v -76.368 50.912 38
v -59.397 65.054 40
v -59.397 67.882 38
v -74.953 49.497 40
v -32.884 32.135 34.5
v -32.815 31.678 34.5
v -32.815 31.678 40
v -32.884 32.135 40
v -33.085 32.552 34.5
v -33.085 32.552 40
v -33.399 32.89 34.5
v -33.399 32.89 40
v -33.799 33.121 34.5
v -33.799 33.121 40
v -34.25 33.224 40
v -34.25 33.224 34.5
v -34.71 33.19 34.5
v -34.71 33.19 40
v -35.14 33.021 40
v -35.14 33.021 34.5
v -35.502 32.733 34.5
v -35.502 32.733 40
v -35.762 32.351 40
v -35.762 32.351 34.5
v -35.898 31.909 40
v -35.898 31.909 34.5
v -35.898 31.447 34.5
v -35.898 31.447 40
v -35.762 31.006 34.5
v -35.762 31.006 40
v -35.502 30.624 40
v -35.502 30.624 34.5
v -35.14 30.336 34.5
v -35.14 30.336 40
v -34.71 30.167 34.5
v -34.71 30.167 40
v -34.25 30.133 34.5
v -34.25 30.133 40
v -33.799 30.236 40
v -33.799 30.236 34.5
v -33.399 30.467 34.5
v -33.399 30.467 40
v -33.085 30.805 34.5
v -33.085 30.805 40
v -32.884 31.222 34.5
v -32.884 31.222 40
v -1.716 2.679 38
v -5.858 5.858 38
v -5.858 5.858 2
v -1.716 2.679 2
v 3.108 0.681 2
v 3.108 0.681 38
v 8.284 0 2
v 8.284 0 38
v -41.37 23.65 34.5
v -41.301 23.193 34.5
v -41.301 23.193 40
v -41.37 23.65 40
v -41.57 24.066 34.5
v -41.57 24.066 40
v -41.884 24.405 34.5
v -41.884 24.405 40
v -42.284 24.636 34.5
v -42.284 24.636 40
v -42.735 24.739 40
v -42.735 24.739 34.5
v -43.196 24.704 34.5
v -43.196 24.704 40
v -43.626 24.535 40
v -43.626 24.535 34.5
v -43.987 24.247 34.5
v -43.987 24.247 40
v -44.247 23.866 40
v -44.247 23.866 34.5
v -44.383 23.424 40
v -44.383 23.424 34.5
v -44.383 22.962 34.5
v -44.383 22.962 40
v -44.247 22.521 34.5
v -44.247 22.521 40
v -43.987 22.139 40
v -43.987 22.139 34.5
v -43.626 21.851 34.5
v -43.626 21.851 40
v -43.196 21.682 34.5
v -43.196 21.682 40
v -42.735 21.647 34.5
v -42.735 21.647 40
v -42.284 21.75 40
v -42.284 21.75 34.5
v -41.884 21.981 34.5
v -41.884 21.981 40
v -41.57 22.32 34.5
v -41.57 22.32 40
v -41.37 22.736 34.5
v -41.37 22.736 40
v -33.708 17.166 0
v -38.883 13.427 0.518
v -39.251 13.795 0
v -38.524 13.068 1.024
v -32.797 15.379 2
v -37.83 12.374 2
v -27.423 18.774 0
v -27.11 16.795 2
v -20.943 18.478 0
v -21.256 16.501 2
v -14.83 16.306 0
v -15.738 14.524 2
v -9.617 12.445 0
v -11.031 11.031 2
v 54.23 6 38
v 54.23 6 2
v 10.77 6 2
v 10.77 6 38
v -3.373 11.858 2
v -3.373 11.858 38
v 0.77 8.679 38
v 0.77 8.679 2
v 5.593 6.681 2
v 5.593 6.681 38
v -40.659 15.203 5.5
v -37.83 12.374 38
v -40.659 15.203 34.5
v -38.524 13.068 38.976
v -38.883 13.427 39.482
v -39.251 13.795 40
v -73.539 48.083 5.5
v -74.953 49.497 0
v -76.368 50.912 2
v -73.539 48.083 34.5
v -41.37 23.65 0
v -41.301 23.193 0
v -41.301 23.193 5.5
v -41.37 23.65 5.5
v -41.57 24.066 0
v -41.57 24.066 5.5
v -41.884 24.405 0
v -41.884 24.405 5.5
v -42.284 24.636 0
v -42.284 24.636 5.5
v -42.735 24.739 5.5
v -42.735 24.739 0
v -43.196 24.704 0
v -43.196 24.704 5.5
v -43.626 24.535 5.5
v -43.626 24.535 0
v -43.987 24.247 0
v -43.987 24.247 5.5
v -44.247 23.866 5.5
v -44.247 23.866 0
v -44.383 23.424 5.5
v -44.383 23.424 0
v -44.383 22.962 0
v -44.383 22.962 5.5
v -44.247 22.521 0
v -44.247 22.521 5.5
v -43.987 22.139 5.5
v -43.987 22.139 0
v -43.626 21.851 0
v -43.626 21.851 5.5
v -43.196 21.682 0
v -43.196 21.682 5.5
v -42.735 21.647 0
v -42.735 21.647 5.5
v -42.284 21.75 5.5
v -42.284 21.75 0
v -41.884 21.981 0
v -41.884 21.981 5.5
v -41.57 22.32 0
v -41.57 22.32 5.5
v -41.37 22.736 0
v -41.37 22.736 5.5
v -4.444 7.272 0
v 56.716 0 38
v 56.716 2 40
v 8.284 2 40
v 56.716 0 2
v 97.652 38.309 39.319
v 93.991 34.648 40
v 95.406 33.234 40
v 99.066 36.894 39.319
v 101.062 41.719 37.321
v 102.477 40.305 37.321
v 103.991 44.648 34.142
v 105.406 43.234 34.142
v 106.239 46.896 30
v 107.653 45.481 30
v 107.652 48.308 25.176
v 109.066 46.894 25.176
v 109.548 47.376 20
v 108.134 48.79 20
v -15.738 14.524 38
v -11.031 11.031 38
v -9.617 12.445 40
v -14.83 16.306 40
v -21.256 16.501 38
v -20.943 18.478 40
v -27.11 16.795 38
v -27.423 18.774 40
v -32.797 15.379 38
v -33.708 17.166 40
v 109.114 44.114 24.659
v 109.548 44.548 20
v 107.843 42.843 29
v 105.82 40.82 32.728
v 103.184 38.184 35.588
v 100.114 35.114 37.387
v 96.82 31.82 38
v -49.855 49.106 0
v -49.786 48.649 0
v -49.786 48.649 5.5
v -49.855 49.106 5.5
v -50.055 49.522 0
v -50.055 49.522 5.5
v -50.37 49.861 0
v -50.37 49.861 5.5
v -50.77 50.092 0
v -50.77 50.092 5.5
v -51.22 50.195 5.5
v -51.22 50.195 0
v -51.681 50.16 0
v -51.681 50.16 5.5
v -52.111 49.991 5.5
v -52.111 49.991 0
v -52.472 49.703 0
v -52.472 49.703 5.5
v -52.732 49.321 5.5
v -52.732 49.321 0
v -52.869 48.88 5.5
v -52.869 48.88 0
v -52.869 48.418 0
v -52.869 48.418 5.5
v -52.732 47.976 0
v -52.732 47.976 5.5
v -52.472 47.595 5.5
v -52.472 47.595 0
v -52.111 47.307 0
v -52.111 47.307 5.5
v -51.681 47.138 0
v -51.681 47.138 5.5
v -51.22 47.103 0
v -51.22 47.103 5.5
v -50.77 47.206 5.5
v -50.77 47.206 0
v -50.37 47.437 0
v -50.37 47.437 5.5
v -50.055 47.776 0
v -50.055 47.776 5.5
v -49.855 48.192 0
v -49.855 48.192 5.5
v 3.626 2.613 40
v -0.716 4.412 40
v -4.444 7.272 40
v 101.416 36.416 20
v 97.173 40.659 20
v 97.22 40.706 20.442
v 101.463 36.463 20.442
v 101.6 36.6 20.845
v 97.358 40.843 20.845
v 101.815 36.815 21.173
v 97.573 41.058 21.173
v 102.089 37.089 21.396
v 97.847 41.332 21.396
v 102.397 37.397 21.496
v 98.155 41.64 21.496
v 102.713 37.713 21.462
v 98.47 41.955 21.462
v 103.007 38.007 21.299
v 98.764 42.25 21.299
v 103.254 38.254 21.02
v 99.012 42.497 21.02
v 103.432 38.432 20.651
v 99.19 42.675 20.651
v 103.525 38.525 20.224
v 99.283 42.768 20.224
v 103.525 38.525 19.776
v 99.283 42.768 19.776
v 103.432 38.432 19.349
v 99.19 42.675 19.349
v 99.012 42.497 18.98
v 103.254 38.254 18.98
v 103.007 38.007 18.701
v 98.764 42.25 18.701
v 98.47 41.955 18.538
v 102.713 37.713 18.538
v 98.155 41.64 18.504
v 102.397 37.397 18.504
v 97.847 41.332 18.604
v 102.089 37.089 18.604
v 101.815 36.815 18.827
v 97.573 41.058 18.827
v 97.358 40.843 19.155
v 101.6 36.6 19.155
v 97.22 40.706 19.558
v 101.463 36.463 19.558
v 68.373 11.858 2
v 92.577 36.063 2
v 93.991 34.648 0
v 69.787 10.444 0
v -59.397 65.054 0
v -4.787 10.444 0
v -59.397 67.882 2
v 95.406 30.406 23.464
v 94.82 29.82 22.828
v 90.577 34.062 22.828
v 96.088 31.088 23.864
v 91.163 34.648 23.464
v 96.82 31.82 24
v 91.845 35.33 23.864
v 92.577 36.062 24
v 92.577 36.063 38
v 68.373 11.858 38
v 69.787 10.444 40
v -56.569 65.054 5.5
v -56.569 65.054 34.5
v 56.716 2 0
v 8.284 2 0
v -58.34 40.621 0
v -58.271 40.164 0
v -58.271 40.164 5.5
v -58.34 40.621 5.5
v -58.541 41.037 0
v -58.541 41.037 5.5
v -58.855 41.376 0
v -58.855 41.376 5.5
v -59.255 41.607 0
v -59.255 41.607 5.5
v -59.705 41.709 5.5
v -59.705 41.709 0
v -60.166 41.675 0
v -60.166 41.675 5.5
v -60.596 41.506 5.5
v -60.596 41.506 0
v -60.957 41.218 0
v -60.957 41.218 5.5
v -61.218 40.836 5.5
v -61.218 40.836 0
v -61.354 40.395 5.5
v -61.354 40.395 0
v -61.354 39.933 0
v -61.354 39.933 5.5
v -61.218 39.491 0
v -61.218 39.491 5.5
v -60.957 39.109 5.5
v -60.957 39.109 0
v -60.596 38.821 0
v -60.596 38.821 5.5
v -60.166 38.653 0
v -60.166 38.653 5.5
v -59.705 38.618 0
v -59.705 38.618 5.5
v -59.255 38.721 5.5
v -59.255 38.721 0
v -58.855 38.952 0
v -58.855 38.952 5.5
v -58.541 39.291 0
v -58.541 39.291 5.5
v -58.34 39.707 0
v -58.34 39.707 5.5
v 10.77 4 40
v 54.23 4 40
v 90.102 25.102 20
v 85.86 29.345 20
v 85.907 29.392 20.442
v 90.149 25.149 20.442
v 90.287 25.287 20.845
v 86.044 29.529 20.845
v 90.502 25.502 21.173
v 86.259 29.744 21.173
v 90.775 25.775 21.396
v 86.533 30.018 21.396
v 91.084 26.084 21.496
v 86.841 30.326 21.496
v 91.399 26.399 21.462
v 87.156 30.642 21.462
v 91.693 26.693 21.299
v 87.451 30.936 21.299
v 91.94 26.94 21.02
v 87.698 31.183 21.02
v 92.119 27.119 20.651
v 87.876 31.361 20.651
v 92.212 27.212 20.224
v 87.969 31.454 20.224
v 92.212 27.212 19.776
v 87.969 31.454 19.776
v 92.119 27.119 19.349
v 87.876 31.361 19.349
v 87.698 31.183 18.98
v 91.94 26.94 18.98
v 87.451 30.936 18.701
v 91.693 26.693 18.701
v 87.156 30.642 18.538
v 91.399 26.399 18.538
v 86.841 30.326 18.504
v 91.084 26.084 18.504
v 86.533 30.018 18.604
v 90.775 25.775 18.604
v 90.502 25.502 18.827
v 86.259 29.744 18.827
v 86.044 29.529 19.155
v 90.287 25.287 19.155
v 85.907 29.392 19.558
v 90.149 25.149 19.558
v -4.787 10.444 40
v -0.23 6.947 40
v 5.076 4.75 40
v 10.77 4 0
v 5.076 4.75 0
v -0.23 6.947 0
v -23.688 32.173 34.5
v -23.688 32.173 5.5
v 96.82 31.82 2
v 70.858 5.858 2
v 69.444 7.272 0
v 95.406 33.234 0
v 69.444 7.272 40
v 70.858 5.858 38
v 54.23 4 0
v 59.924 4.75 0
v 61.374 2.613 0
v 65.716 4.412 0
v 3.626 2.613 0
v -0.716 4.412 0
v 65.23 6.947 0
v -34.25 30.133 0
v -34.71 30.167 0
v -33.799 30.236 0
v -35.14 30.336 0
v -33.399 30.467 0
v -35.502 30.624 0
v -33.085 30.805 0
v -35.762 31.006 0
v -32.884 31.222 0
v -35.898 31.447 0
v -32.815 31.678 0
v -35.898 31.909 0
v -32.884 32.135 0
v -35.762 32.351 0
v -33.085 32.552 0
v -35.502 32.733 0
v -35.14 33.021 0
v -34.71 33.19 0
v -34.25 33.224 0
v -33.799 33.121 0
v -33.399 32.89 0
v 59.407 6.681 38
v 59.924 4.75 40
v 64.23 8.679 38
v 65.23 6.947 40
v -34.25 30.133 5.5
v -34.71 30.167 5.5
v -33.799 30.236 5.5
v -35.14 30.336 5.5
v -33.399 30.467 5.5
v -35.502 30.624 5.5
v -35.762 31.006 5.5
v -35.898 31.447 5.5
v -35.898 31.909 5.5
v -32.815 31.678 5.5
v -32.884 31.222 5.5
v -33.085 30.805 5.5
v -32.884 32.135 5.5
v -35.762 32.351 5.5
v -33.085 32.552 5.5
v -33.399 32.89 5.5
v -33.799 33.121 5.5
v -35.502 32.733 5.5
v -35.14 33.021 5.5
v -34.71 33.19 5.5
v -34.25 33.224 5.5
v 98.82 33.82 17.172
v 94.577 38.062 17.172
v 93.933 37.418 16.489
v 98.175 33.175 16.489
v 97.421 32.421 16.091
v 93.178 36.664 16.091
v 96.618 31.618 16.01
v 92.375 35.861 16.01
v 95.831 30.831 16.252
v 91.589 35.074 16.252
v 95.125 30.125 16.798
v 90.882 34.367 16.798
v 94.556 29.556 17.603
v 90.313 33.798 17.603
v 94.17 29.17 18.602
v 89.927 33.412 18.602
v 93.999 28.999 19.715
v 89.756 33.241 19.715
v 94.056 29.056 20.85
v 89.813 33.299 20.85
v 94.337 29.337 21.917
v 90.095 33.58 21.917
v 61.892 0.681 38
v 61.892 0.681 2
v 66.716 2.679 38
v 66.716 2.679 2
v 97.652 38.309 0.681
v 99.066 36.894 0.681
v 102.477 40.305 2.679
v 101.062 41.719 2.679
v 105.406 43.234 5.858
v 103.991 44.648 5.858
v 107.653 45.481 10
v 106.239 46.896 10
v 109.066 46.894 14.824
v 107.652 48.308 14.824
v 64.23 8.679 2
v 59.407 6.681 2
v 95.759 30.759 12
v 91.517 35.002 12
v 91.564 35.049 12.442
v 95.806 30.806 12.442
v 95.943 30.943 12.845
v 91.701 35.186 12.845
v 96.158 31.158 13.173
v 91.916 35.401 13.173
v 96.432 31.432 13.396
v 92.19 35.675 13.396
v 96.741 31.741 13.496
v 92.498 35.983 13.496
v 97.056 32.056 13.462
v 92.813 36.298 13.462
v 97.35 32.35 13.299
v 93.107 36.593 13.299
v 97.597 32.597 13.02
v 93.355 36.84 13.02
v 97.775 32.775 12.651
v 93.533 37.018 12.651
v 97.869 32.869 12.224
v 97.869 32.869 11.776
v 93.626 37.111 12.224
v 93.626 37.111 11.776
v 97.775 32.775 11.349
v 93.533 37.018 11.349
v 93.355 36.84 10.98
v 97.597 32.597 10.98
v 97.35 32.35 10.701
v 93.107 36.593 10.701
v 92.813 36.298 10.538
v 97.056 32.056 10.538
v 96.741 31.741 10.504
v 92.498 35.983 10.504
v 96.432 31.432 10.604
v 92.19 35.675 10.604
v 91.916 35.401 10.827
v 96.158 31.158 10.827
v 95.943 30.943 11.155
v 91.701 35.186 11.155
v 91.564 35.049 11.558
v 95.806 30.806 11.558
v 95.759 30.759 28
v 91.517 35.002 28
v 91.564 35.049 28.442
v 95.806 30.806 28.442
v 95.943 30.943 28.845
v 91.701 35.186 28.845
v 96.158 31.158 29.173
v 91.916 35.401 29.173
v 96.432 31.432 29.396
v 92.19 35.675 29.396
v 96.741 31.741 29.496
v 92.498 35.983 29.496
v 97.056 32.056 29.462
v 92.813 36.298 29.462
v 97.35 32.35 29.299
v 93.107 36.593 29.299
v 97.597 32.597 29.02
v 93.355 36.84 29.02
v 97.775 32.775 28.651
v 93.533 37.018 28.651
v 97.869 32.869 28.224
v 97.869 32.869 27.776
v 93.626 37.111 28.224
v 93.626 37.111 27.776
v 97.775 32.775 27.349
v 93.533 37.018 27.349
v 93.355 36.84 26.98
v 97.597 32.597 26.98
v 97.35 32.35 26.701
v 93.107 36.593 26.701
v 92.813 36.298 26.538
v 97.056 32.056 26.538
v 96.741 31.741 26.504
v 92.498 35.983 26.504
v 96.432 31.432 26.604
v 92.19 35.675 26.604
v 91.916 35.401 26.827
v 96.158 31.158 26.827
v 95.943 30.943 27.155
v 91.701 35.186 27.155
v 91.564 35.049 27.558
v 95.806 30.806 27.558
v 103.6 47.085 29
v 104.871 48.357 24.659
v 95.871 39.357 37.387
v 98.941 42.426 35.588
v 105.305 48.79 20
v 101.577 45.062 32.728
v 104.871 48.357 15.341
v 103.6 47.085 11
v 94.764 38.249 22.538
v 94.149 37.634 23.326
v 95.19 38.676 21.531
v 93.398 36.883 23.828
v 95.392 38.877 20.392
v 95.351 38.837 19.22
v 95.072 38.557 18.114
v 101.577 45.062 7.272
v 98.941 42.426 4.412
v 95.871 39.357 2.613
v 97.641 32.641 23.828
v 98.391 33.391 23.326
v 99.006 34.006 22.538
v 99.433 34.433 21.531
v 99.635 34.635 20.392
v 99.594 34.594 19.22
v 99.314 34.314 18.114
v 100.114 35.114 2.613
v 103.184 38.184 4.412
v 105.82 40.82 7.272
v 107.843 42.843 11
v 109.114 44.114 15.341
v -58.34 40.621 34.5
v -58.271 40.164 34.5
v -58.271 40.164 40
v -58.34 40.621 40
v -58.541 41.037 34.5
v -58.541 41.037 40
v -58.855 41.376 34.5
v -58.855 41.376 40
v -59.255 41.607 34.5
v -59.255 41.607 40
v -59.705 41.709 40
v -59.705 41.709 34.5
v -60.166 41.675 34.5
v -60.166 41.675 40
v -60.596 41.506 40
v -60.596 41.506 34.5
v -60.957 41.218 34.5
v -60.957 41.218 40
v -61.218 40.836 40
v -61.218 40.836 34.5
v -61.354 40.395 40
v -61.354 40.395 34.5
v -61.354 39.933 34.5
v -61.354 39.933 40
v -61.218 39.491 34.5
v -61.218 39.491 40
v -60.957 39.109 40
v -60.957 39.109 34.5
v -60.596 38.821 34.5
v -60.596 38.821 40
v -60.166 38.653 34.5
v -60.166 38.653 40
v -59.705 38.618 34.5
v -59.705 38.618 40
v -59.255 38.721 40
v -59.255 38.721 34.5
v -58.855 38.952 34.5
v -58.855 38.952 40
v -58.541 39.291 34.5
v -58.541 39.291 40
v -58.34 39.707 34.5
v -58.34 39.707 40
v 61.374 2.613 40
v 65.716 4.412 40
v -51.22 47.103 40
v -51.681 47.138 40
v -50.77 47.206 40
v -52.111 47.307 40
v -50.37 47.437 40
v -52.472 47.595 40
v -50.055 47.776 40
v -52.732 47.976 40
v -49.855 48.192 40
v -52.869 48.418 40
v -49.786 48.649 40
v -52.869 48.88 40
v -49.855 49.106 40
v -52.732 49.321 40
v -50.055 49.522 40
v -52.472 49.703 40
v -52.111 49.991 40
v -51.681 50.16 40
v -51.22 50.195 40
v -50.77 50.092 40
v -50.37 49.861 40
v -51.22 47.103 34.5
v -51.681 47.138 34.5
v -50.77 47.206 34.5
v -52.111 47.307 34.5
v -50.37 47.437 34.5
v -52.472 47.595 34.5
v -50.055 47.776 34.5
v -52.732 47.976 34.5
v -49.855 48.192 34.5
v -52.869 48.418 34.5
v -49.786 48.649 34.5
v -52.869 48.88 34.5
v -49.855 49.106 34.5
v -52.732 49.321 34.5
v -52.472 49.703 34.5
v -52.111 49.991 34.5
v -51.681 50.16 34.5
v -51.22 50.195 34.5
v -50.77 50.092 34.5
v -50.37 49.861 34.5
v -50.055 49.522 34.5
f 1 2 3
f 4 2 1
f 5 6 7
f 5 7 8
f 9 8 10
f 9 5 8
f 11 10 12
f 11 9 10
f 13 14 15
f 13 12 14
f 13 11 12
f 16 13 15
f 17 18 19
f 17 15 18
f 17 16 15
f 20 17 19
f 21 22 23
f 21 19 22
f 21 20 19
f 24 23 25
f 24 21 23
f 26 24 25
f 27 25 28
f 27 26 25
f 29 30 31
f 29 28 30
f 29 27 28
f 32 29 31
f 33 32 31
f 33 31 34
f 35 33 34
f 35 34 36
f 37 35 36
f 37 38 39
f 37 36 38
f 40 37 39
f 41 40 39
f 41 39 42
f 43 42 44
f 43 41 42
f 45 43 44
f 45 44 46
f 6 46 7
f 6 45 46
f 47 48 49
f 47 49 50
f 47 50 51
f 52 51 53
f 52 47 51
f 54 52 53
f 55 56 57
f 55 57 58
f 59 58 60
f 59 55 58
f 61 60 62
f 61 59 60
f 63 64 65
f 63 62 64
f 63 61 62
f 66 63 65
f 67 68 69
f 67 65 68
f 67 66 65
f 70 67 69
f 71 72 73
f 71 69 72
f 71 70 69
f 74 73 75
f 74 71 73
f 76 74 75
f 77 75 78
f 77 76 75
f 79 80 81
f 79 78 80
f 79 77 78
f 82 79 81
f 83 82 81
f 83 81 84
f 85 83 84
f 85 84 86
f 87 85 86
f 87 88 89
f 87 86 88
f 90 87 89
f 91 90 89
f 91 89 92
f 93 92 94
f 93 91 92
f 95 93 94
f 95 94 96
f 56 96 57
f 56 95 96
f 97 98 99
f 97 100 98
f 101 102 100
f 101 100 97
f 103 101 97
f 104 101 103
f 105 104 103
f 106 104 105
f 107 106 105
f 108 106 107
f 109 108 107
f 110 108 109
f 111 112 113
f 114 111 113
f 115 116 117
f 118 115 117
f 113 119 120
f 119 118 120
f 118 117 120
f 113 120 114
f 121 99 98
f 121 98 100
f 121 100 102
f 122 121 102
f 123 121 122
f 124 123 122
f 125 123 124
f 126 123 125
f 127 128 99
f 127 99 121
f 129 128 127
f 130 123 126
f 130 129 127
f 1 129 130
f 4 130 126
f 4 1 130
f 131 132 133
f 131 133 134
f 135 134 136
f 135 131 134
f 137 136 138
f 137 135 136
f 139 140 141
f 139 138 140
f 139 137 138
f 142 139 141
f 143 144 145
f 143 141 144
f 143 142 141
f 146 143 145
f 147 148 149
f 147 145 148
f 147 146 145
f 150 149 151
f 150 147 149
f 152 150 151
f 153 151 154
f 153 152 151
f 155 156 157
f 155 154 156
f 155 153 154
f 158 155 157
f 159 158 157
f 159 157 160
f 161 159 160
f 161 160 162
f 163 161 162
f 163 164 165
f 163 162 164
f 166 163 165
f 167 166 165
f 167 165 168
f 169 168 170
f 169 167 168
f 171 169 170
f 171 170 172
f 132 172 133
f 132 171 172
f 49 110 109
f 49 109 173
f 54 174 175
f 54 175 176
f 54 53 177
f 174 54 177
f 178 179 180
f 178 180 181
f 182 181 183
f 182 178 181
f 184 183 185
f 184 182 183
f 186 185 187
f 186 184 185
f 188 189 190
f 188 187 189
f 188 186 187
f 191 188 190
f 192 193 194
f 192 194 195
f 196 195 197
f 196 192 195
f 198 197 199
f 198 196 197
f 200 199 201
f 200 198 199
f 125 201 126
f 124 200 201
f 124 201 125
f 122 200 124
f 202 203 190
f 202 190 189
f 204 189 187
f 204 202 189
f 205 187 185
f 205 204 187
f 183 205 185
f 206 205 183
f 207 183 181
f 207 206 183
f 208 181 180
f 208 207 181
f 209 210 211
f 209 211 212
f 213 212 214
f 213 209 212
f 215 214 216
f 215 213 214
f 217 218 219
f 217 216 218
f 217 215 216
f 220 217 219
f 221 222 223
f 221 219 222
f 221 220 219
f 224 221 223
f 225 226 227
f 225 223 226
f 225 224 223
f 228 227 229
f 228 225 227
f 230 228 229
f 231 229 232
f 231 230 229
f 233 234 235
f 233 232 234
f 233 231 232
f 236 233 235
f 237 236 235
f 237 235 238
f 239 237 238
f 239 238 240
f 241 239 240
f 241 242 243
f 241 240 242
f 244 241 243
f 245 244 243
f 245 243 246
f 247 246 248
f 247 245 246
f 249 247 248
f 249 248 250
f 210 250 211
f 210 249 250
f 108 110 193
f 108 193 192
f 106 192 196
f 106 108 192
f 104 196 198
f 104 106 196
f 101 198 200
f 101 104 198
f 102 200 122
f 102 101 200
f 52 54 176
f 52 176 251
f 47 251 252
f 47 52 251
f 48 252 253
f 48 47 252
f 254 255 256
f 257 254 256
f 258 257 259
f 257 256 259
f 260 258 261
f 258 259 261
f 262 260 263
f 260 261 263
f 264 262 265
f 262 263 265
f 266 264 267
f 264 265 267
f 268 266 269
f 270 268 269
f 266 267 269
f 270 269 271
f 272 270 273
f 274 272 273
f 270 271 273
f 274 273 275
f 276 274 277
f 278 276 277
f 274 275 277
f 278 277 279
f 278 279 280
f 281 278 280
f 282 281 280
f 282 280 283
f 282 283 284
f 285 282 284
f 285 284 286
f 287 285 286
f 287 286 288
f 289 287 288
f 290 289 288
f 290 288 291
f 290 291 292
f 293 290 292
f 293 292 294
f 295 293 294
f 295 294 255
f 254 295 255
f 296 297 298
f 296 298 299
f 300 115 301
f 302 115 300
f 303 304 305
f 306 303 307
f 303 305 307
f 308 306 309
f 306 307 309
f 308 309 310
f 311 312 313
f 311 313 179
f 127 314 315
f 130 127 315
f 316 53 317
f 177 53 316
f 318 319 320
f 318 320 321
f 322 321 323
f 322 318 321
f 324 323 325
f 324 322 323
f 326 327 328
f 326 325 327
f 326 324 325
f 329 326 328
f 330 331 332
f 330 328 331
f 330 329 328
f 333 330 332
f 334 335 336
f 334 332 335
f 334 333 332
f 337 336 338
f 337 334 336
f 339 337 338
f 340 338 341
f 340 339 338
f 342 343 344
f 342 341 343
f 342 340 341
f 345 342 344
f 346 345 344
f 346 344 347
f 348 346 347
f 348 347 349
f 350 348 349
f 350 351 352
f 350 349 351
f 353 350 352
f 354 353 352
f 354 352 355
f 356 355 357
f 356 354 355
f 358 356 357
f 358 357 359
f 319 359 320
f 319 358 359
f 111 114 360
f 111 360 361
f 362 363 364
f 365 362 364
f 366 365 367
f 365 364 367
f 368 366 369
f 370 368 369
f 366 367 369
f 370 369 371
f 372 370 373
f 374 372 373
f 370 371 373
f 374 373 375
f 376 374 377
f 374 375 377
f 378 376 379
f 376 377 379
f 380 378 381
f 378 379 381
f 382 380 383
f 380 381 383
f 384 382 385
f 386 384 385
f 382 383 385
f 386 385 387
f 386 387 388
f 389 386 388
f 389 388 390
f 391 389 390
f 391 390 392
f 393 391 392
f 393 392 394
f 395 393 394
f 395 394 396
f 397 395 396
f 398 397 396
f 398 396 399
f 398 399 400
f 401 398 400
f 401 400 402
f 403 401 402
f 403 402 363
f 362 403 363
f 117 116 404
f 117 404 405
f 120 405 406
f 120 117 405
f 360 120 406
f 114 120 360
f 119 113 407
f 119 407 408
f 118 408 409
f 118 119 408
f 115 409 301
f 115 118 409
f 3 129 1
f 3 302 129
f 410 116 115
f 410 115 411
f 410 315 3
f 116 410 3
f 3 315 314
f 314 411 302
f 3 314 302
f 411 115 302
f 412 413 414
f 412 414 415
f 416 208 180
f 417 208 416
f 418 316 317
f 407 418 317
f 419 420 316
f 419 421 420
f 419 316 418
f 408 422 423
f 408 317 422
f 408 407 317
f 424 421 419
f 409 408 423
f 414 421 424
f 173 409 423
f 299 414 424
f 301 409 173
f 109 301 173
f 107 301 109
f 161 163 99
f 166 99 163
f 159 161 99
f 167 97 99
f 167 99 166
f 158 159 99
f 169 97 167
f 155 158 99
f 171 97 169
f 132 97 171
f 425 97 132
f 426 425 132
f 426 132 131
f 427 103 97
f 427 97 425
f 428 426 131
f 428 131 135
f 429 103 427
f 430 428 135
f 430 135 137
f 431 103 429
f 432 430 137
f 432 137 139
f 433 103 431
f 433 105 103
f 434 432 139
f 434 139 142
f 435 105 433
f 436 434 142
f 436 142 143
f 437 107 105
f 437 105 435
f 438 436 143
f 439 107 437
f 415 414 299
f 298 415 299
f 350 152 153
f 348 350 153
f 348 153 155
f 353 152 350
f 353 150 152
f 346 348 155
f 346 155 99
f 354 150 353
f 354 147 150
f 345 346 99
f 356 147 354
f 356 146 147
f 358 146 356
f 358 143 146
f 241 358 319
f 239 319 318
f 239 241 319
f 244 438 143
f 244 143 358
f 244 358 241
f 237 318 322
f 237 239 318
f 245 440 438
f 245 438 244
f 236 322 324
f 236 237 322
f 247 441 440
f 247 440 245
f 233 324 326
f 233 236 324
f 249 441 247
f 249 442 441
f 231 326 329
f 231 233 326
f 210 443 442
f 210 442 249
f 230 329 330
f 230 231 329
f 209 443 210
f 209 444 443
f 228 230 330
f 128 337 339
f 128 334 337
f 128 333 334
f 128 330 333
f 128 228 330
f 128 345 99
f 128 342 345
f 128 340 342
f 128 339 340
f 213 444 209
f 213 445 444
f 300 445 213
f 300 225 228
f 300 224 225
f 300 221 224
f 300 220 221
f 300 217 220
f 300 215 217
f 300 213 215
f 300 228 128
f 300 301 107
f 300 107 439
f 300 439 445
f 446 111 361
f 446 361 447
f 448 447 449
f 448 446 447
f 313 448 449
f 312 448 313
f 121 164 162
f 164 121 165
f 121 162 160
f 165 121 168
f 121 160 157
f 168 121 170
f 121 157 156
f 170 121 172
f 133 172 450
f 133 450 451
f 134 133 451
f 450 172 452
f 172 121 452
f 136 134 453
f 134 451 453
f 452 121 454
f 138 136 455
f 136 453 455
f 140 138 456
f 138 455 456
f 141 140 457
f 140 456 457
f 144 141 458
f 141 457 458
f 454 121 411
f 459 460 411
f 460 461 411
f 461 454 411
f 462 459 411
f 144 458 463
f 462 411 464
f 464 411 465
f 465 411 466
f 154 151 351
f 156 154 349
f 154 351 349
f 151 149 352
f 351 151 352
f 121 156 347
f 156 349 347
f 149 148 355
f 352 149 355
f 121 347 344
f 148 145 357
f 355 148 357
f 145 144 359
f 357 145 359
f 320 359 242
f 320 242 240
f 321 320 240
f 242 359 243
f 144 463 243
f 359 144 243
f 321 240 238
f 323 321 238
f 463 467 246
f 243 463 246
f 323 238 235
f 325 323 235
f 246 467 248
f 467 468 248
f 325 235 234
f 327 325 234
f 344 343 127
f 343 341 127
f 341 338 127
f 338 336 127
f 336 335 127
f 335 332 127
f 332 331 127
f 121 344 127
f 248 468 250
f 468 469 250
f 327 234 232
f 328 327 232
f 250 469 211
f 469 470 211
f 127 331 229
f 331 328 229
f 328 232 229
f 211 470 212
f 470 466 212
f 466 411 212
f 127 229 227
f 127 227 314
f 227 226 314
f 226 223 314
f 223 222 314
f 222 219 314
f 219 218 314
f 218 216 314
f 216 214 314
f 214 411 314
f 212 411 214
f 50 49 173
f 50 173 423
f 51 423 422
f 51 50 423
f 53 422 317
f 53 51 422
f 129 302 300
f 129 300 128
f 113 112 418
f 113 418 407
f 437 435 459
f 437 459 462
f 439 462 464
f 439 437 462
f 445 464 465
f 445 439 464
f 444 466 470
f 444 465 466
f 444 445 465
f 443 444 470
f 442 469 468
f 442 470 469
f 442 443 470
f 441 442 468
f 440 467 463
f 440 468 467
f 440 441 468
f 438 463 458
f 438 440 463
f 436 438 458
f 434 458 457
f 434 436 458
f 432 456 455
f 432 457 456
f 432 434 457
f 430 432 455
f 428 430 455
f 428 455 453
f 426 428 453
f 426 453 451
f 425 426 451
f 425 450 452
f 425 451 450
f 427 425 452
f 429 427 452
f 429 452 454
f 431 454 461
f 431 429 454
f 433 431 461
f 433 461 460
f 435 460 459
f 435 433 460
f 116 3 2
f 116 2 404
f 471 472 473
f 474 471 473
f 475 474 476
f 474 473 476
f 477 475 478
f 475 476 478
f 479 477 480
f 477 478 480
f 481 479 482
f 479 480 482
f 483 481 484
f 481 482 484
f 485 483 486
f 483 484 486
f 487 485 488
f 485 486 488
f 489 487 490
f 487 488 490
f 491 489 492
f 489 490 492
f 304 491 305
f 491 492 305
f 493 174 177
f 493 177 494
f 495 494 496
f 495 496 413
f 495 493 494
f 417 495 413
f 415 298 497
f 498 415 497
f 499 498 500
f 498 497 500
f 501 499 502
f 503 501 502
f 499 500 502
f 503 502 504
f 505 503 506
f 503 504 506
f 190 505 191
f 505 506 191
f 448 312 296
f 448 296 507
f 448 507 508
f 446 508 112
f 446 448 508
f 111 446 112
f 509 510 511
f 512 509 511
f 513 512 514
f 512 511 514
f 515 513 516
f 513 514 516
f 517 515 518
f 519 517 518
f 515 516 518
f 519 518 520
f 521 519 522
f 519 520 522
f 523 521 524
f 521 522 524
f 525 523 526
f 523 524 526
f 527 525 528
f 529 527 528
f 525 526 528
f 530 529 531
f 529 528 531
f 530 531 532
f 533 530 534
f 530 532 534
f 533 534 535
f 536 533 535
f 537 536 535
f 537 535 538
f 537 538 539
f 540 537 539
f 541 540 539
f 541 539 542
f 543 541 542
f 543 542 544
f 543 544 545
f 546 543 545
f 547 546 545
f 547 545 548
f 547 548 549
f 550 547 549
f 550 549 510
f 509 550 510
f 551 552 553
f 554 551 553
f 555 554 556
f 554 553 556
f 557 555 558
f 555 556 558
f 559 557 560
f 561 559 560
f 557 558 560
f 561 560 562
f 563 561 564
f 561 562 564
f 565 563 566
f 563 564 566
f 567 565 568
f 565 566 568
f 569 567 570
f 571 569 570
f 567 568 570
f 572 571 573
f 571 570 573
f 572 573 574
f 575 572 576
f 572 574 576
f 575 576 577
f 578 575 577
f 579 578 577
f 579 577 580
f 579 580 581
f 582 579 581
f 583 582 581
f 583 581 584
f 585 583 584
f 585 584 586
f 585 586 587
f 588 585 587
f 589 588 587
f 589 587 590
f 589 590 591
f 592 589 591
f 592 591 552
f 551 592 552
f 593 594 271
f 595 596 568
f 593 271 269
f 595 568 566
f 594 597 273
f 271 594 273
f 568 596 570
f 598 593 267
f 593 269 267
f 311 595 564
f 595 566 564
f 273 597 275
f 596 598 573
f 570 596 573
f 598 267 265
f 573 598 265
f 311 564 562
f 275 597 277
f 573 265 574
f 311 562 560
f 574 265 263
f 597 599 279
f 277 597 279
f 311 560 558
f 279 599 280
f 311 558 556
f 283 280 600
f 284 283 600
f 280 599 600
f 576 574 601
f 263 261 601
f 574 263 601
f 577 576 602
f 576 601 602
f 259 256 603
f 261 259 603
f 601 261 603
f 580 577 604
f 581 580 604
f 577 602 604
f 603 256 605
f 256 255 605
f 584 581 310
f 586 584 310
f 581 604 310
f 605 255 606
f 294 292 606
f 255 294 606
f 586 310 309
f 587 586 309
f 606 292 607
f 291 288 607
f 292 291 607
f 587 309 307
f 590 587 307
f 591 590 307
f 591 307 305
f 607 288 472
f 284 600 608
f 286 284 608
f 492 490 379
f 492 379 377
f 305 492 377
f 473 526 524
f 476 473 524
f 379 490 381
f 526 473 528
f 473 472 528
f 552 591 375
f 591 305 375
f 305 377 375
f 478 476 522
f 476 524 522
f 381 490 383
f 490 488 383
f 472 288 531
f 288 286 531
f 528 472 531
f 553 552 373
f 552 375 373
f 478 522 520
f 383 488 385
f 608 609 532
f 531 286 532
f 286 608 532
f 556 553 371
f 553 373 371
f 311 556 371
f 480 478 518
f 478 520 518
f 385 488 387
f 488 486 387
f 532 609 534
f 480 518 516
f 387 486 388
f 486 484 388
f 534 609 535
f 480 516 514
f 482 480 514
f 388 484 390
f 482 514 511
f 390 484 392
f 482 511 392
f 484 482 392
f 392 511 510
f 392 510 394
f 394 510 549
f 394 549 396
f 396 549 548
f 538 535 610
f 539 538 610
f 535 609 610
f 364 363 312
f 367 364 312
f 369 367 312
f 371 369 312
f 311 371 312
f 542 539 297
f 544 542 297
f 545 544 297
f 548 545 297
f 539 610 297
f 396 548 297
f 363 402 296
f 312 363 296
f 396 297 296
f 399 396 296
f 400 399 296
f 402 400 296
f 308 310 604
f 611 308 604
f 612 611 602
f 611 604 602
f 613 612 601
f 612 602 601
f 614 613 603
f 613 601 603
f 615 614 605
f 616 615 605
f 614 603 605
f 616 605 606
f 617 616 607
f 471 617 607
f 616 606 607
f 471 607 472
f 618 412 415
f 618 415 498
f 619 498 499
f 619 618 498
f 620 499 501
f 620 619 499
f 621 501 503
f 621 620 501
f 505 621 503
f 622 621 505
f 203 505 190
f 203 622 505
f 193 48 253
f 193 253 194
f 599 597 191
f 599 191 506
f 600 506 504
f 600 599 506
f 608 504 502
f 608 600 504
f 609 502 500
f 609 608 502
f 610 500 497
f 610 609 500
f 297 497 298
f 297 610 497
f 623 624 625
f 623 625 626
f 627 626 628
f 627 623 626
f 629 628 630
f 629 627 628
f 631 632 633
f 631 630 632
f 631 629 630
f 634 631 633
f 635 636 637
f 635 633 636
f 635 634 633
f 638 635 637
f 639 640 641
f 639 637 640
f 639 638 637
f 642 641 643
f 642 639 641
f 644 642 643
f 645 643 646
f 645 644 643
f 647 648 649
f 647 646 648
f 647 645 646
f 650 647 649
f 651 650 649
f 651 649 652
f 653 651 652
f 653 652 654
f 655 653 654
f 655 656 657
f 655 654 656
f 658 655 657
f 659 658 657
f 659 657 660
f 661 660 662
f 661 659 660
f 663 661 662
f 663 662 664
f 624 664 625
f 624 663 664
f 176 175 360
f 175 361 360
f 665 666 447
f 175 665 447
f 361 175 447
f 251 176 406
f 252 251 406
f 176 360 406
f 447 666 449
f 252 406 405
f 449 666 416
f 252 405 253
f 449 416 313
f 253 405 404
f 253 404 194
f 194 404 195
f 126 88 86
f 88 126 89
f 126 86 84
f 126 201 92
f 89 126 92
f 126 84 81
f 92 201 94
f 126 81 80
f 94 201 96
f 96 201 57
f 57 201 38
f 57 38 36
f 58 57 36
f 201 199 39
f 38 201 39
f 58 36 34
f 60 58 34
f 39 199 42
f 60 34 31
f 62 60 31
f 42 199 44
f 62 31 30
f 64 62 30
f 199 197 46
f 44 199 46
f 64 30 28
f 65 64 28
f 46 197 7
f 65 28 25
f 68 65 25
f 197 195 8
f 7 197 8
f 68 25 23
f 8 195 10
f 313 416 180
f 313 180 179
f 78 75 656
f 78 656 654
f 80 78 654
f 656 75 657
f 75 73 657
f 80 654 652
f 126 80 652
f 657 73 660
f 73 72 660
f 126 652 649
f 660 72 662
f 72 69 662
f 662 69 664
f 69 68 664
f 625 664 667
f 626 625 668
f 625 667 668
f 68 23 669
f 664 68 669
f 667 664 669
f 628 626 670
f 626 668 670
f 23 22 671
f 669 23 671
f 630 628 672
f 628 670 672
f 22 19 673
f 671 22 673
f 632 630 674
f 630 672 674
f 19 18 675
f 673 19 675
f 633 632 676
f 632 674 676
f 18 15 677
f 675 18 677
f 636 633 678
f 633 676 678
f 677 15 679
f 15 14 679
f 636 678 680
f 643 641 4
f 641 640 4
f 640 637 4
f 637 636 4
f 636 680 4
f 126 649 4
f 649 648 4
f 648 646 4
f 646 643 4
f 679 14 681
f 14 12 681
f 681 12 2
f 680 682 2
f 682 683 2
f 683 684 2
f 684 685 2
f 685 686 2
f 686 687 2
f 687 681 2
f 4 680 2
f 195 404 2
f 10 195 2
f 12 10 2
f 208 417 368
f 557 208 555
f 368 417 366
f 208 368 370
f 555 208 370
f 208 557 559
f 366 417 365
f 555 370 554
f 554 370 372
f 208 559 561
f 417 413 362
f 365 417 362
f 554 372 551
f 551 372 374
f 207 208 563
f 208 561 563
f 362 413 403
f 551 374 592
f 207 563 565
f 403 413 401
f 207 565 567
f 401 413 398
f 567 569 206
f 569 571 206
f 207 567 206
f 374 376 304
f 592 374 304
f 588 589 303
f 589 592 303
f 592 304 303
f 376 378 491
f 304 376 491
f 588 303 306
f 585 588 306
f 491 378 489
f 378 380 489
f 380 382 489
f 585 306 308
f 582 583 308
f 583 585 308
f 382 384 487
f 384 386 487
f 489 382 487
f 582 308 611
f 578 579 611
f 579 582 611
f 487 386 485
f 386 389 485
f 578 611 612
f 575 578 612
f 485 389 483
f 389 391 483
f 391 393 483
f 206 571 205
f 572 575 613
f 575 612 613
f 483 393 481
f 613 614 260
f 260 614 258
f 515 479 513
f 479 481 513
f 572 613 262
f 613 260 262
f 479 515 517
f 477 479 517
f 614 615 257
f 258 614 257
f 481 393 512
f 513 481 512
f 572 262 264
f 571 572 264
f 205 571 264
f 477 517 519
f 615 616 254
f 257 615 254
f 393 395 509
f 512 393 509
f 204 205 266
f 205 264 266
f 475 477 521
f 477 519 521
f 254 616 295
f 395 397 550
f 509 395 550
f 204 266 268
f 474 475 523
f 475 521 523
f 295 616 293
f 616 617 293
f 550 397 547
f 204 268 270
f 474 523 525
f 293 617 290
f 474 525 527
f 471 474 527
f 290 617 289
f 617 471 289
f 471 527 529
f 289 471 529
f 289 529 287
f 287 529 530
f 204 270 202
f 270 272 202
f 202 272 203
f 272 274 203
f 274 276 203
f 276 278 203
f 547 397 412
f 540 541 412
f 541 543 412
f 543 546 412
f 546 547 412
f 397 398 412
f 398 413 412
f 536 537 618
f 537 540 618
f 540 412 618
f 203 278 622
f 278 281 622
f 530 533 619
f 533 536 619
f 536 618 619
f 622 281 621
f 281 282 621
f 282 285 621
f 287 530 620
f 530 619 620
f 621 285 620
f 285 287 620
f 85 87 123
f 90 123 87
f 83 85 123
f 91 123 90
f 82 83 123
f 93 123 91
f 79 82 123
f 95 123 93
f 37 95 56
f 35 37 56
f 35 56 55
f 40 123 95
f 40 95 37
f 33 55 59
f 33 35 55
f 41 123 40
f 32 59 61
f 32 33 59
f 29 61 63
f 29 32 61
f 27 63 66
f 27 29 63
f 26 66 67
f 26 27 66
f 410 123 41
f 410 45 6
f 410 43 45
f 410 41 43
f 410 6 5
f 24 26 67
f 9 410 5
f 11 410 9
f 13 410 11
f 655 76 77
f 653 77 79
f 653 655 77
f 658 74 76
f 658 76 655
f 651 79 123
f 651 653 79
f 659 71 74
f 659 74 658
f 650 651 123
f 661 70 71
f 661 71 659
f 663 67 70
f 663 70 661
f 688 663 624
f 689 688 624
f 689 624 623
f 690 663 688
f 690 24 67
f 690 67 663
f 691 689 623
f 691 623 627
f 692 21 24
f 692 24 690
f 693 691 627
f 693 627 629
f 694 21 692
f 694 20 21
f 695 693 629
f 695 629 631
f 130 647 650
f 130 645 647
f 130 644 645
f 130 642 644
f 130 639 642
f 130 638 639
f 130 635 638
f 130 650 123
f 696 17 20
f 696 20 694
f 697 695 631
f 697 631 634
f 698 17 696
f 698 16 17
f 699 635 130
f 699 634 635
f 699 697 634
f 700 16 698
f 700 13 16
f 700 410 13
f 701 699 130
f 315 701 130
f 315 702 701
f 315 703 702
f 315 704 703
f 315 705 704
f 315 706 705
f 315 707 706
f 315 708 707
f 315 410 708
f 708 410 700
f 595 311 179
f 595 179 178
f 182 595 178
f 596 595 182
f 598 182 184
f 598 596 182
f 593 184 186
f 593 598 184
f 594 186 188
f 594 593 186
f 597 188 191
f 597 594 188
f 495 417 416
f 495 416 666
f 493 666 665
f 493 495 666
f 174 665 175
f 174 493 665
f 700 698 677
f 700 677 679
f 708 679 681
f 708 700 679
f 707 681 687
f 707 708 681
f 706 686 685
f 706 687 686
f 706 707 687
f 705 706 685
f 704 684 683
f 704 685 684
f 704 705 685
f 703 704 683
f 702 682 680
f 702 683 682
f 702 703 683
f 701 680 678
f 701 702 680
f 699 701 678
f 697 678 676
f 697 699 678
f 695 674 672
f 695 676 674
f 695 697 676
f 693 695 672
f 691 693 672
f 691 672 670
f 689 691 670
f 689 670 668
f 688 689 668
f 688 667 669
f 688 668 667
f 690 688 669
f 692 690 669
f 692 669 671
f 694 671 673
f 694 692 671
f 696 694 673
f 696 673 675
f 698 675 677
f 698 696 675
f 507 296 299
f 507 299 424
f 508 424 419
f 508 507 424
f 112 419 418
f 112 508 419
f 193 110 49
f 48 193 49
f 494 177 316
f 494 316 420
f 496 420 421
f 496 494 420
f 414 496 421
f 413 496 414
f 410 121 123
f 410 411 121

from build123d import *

# Parameters (mm, degrees)
BOSS_EXTRUDE1_DEPTH     = 40
SKETCH2_R               = 1.5
CUT_EXTRUDE1_DEPTH      = 40
SKETCH3_W               = 40
SKETCH3_H               = 54.5
SKETCH3_W_2             = 29
SKETCH3_H_2             = 46.5
BOSS_EXTRUDE2_DEPTH     = 18
SKETCH4_W               = 29
SKETCH4_H               = 46.5
CUT_EXTRUDE2_DEPTH      = 40
CUT_EXTRUDE3_DEPTH      = 137.090235877
CUT_EXTRUDE3_DEPTH_BACK = 137.090235877
SKETCH5_R               = 1.55
SKETCH5_R_2             = 1.05
FILLET1_R               = 20
FILLET2_R               = 20
FILLET3_R               = 20
CHAMFER1_SIZE           = 2


# Some blends are built 0.0001 mm under size
with BuildPart() as part:
    # Sketch1 → Boss-Extrude1 (new body)
    with BuildSketch(Plane.XY):
        Polygon((-63.639610307, 63.639610307), (0, 0), (0, 6), (2.485281374, 6), (-59.39696962, 67.882250994), align=None)
        Polygon((0, 6), (0, 0), (4.242640687, 4.242640687), (2.485281374, 6), align=None)
        Polygon((4.242640687, 4.242640687), (0, 0), (65, 0), (60.757359313, 4.242640687), (62.514718626, 6), (2.485281374, 6), align=None)
        Polygon((60.757359313, 4.242640687), (65, 0), (65, 6), (62.514718626, 6), align=None)
        Polygon((65, 6), (65, 0), (110.961940777, 45.961940777), (106.71930009, 50.204581464), (62.514718626, 6), align=None)
    extrude(amount=BOSS_EXTRUDE1_DEPTH)

    # Sketch2 → Cut-Extrude1 (cut)
    with BuildSketch(Plane(origin=(28.257359313, -28.257359313, 0), x_dir=(0, 0, 1), z_dir=(-0.7071067811865464, 0.7071067811865488, 0))):
        with Locations(Location((20, 82.961940777, 0), (0, 0, 270))):
            Circle(SKETCH2_R)
        with Locations(Location((12, 90.961940777, 0), (0, 0, 270))):
            Circle(SKETCH2_R)
        with BuildLine():
            ThreePointArc((24, 90.961940777), (21.530733729, 94.657458907), (17.171572875, 93.790367902))
            Line((17.171572875, 93.790367902), (22.828427125, 88.133513652))
            ThreePointArc((22.828427125, 88.133513652), (23.69551813, 89.431207048), (24, 90.961940777))
        make_face()
        with BuildLine():
            Line((22.828427125, 88.133513652), (17.171572875, 93.790367902))
            ThreePointArc((17.171572875, 93.790367902), (17.171572875, 88.133513652), (22.828427125, 88.133513652))
        make_face()
        with Locations(Location((20, 98.961940777, 0), (0, 0, 270))):
            Circle(SKETCH2_R)
        with Locations(Location((28, 90.961940777, 0), (0, 0, 270))):
            Circle(SKETCH2_R)
    extrude(amount=-CUT_EXTRUDE1_DEPTH, mode=Mode.SUBTRACT)

    # Sketch3 → Boss-Extrude2 (add)
    with BuildSketch(Plane(origin=(0, 0, 0), x_dir=(0, 0, 1), z_dir=(-0.7071067811865464, -0.7071067811865488, 0))):
        with Locations((20, 62.75)):
            Rectangle(SKETCH3_W, SKETCH3_H)
        with Locations((20, 62.75)):
            Rectangle(SKETCH3_W_2, SKETCH3_H_2, mode=Mode.SUBTRACT)
    extrude(amount=BOSS_EXTRUDE2_DEPTH)

    # Sketch4 → Cut-Extrude2 (cut)
    with BuildSketch(Plane(origin=(0, 0, 0), x_dir=(0, 0, 1), z_dir=(-0.7071067811865464, -0.7071067811865488, 0))):
        with Locations((20, 62.75)):
            Rectangle(SKETCH4_W, SKETCH4_H)
    extrude(amount=-CUT_EXTRUDE2_DEPTH, mode=Mode.SUBTRACT)

    # Sketch5 → Cut-Extrude3 (cut, two sides: drawn at the far end of the back side and taken through both)
    # profile 1 of 8: a face of its own
    with BuildSketch(Plane.XY.offset(40).offset(-CUT_EXTRUDE3_DEPTH_BACK)):
        with Locations((-51.335952314, 48.648946546)):
            Circle(SKETCH5_R)
        with Locations((-51.335952314, 48.648946546)):
            Circle(SKETCH5_R_2, mode=Mode.SUBTRACT)
    # profile 2 of 8: a face of its own
    with BuildSketch(Plane.XY.offset(40).offset(-CUT_EXTRUDE3_DEPTH_BACK)):
        with Locations((-51.335952314, 48.648946546)):
            Circle(SKETCH5_R_2)
    # profile 3 of 8: a face of its own
    with BuildSketch(Plane.XY.offset(40).offset(-CUT_EXTRUDE3_DEPTH_BACK)):
        with Locations((-59.821233688, 40.163665171)):
            Circle(SKETCH5_R)
        with Locations((-59.821233688, 40.163665171)):
            Circle(SKETCH5_R_2, mode=Mode.SUBTRACT)
    # profile 4 of 8: a face of its own
    with BuildSketch(Plane.XY.offset(40).offset(-CUT_EXTRUDE3_DEPTH_BACK)):
        with Locations((-59.821233688, 40.163665171)):
            Circle(SKETCH5_R_2)
    # profile 5 of 8: a face of its own
    with BuildSketch(Plane.XY.offset(40).offset(-CUT_EXTRUDE3_DEPTH_BACK)):
        with Locations((-34.365389566, 31.678383797)):
            Circle(SKETCH5_R)
        with Locations((-34.365389566, 31.678383797)):
            Circle(SKETCH5_R_2, mode=Mode.SUBTRACT)
    # profile 6 of 8: a face of its own
    with BuildSketch(Plane.XY.offset(40).offset(-CUT_EXTRUDE3_DEPTH_BACK)):
        with Locations((-34.365389566, 31.678383797)):
            Circle(SKETCH5_R_2)
    # profile 7 of 8: a face of its own
    with BuildSketch(Plane.XY.offset(40).offset(-CUT_EXTRUDE3_DEPTH_BACK)):
        with Locations((-42.85067094, 23.193102423)):
            Circle(SKETCH5_R)
        with Locations((-42.85067094, 23.193102423)):
            Circle(SKETCH5_R_2, mode=Mode.SUBTRACT)
    # profile 8 of 8: a face of its own
    with BuildSketch(Plane.XY.offset(40).offset(-CUT_EXTRUDE3_DEPTH_BACK)):
        with Locations((-42.85067094, 23.193102423)):
            Circle(SKETCH5_R_2)
    extrude(amount=CUT_EXTRUDE3_DEPTH + CUT_EXTRUDE3_DEPTH_BACK, mode=Mode.SUBTRACT)

    # Fillet1
    fillet1_edges = [part.edges().sort_by_distance(p)[0] for p in [
        (0, 0, 20),
        (2.485281374, 6, 20),
        (62.514718626, 6, 20),
        (65, 0, 20),
    ]]
    fillet(fillet1_edges, radius=FILLET1_R)

    # Fillet2
    # the kernel refuses this fillet: 20 mm, written as the material it adds along each edge
    with BuildSketch(Plane(origin=(-25.102290732, 25.102290732, 0), x_dir=(0.7071067811865487, -0.7071067811865465, 0), z_dir=(0, 0, 1))) as fillet2_piece_1:
        with BuildLine():
            CenterArc((19.899748742, -20), FILLET2_R, 90, 84.260829523)
            Line((0, -18), (-0.397994975, -17.96))
            ThreePointArc((-0.397994975, -17.96), (-0.4, -9), (-0.4, 0))
            Line((-0.4, 0), (0, 0.4))
            Line((0, 0.4), (19.899748742, 0.4))
            Line((19.899748742, 0.4), (19.899748742, 0))
        make_face()
    extrude(amount=40)

    # Fillet3
    fillet3_edges = [part.edges().sort_by_distance(p)[0] for p in [
        (108.840620434, 48.083261121, 0),
        (108.840620434, 48.083261121, 40),
    ]]
    fillet(fillet3_edges, radius=FILLET3_R - 0.0001)  # a hair under: the kernel refuses the full size

    # Chamfer1
    chamfer1_edges = [part.edges().sort_by_distance(p)[0] for p in [
        (-67.882250994, 59.39696962, 0),
        (32.5, 0, 0),
        (32.5, 0, 40),
        (-8.444453914, 8.444453914, 0),
        (-31.384776311, 39.870057685, 0),
        (32.5, 6, 0),
        (80.474909089, 23.960190464, 0),
        (83.83887012, 18.83887012, 0),
        (64.3693974, 1.52240935, 0),
        (0.6306026, 1.52240935, 0),
        (-8.444453914, 8.444453914, 40),
        (83.83887012, 18.83887012, 40),
        (80.474909089, 23.960190464, 40),
        (32.5, 6, 40),
        (-31.384776311, 39.870057685, 40),
        (64.3693974, 1.52240935, 40),
        (0.6306026, 1.52240935, 40),
        (3.115883974, 7.52240935, 0),
        (3.115883974, 7.52240935, 40),
        (61.884116026, 7.52240935, 0),
        (61.884116026, 7.52240935, 40),
        (-24.171923575, 16.863829291, 40),
        (-24.171923575, 16.863829291, 0),
        (106.819825864, 41.819825864, 34.142164913),
        (106.819825864, 41.819825864, 5.857835087),
        (102.577185177, 46.062466551, 34.142164913),
        (102.577185177, 46.062466551, 5.857835087),
        (-67.882250994, 59.39696962, 40),
    ]]
    chamfer(chamfer1_edges, length=CHAMFER1_SIZE)


solid = part.part
